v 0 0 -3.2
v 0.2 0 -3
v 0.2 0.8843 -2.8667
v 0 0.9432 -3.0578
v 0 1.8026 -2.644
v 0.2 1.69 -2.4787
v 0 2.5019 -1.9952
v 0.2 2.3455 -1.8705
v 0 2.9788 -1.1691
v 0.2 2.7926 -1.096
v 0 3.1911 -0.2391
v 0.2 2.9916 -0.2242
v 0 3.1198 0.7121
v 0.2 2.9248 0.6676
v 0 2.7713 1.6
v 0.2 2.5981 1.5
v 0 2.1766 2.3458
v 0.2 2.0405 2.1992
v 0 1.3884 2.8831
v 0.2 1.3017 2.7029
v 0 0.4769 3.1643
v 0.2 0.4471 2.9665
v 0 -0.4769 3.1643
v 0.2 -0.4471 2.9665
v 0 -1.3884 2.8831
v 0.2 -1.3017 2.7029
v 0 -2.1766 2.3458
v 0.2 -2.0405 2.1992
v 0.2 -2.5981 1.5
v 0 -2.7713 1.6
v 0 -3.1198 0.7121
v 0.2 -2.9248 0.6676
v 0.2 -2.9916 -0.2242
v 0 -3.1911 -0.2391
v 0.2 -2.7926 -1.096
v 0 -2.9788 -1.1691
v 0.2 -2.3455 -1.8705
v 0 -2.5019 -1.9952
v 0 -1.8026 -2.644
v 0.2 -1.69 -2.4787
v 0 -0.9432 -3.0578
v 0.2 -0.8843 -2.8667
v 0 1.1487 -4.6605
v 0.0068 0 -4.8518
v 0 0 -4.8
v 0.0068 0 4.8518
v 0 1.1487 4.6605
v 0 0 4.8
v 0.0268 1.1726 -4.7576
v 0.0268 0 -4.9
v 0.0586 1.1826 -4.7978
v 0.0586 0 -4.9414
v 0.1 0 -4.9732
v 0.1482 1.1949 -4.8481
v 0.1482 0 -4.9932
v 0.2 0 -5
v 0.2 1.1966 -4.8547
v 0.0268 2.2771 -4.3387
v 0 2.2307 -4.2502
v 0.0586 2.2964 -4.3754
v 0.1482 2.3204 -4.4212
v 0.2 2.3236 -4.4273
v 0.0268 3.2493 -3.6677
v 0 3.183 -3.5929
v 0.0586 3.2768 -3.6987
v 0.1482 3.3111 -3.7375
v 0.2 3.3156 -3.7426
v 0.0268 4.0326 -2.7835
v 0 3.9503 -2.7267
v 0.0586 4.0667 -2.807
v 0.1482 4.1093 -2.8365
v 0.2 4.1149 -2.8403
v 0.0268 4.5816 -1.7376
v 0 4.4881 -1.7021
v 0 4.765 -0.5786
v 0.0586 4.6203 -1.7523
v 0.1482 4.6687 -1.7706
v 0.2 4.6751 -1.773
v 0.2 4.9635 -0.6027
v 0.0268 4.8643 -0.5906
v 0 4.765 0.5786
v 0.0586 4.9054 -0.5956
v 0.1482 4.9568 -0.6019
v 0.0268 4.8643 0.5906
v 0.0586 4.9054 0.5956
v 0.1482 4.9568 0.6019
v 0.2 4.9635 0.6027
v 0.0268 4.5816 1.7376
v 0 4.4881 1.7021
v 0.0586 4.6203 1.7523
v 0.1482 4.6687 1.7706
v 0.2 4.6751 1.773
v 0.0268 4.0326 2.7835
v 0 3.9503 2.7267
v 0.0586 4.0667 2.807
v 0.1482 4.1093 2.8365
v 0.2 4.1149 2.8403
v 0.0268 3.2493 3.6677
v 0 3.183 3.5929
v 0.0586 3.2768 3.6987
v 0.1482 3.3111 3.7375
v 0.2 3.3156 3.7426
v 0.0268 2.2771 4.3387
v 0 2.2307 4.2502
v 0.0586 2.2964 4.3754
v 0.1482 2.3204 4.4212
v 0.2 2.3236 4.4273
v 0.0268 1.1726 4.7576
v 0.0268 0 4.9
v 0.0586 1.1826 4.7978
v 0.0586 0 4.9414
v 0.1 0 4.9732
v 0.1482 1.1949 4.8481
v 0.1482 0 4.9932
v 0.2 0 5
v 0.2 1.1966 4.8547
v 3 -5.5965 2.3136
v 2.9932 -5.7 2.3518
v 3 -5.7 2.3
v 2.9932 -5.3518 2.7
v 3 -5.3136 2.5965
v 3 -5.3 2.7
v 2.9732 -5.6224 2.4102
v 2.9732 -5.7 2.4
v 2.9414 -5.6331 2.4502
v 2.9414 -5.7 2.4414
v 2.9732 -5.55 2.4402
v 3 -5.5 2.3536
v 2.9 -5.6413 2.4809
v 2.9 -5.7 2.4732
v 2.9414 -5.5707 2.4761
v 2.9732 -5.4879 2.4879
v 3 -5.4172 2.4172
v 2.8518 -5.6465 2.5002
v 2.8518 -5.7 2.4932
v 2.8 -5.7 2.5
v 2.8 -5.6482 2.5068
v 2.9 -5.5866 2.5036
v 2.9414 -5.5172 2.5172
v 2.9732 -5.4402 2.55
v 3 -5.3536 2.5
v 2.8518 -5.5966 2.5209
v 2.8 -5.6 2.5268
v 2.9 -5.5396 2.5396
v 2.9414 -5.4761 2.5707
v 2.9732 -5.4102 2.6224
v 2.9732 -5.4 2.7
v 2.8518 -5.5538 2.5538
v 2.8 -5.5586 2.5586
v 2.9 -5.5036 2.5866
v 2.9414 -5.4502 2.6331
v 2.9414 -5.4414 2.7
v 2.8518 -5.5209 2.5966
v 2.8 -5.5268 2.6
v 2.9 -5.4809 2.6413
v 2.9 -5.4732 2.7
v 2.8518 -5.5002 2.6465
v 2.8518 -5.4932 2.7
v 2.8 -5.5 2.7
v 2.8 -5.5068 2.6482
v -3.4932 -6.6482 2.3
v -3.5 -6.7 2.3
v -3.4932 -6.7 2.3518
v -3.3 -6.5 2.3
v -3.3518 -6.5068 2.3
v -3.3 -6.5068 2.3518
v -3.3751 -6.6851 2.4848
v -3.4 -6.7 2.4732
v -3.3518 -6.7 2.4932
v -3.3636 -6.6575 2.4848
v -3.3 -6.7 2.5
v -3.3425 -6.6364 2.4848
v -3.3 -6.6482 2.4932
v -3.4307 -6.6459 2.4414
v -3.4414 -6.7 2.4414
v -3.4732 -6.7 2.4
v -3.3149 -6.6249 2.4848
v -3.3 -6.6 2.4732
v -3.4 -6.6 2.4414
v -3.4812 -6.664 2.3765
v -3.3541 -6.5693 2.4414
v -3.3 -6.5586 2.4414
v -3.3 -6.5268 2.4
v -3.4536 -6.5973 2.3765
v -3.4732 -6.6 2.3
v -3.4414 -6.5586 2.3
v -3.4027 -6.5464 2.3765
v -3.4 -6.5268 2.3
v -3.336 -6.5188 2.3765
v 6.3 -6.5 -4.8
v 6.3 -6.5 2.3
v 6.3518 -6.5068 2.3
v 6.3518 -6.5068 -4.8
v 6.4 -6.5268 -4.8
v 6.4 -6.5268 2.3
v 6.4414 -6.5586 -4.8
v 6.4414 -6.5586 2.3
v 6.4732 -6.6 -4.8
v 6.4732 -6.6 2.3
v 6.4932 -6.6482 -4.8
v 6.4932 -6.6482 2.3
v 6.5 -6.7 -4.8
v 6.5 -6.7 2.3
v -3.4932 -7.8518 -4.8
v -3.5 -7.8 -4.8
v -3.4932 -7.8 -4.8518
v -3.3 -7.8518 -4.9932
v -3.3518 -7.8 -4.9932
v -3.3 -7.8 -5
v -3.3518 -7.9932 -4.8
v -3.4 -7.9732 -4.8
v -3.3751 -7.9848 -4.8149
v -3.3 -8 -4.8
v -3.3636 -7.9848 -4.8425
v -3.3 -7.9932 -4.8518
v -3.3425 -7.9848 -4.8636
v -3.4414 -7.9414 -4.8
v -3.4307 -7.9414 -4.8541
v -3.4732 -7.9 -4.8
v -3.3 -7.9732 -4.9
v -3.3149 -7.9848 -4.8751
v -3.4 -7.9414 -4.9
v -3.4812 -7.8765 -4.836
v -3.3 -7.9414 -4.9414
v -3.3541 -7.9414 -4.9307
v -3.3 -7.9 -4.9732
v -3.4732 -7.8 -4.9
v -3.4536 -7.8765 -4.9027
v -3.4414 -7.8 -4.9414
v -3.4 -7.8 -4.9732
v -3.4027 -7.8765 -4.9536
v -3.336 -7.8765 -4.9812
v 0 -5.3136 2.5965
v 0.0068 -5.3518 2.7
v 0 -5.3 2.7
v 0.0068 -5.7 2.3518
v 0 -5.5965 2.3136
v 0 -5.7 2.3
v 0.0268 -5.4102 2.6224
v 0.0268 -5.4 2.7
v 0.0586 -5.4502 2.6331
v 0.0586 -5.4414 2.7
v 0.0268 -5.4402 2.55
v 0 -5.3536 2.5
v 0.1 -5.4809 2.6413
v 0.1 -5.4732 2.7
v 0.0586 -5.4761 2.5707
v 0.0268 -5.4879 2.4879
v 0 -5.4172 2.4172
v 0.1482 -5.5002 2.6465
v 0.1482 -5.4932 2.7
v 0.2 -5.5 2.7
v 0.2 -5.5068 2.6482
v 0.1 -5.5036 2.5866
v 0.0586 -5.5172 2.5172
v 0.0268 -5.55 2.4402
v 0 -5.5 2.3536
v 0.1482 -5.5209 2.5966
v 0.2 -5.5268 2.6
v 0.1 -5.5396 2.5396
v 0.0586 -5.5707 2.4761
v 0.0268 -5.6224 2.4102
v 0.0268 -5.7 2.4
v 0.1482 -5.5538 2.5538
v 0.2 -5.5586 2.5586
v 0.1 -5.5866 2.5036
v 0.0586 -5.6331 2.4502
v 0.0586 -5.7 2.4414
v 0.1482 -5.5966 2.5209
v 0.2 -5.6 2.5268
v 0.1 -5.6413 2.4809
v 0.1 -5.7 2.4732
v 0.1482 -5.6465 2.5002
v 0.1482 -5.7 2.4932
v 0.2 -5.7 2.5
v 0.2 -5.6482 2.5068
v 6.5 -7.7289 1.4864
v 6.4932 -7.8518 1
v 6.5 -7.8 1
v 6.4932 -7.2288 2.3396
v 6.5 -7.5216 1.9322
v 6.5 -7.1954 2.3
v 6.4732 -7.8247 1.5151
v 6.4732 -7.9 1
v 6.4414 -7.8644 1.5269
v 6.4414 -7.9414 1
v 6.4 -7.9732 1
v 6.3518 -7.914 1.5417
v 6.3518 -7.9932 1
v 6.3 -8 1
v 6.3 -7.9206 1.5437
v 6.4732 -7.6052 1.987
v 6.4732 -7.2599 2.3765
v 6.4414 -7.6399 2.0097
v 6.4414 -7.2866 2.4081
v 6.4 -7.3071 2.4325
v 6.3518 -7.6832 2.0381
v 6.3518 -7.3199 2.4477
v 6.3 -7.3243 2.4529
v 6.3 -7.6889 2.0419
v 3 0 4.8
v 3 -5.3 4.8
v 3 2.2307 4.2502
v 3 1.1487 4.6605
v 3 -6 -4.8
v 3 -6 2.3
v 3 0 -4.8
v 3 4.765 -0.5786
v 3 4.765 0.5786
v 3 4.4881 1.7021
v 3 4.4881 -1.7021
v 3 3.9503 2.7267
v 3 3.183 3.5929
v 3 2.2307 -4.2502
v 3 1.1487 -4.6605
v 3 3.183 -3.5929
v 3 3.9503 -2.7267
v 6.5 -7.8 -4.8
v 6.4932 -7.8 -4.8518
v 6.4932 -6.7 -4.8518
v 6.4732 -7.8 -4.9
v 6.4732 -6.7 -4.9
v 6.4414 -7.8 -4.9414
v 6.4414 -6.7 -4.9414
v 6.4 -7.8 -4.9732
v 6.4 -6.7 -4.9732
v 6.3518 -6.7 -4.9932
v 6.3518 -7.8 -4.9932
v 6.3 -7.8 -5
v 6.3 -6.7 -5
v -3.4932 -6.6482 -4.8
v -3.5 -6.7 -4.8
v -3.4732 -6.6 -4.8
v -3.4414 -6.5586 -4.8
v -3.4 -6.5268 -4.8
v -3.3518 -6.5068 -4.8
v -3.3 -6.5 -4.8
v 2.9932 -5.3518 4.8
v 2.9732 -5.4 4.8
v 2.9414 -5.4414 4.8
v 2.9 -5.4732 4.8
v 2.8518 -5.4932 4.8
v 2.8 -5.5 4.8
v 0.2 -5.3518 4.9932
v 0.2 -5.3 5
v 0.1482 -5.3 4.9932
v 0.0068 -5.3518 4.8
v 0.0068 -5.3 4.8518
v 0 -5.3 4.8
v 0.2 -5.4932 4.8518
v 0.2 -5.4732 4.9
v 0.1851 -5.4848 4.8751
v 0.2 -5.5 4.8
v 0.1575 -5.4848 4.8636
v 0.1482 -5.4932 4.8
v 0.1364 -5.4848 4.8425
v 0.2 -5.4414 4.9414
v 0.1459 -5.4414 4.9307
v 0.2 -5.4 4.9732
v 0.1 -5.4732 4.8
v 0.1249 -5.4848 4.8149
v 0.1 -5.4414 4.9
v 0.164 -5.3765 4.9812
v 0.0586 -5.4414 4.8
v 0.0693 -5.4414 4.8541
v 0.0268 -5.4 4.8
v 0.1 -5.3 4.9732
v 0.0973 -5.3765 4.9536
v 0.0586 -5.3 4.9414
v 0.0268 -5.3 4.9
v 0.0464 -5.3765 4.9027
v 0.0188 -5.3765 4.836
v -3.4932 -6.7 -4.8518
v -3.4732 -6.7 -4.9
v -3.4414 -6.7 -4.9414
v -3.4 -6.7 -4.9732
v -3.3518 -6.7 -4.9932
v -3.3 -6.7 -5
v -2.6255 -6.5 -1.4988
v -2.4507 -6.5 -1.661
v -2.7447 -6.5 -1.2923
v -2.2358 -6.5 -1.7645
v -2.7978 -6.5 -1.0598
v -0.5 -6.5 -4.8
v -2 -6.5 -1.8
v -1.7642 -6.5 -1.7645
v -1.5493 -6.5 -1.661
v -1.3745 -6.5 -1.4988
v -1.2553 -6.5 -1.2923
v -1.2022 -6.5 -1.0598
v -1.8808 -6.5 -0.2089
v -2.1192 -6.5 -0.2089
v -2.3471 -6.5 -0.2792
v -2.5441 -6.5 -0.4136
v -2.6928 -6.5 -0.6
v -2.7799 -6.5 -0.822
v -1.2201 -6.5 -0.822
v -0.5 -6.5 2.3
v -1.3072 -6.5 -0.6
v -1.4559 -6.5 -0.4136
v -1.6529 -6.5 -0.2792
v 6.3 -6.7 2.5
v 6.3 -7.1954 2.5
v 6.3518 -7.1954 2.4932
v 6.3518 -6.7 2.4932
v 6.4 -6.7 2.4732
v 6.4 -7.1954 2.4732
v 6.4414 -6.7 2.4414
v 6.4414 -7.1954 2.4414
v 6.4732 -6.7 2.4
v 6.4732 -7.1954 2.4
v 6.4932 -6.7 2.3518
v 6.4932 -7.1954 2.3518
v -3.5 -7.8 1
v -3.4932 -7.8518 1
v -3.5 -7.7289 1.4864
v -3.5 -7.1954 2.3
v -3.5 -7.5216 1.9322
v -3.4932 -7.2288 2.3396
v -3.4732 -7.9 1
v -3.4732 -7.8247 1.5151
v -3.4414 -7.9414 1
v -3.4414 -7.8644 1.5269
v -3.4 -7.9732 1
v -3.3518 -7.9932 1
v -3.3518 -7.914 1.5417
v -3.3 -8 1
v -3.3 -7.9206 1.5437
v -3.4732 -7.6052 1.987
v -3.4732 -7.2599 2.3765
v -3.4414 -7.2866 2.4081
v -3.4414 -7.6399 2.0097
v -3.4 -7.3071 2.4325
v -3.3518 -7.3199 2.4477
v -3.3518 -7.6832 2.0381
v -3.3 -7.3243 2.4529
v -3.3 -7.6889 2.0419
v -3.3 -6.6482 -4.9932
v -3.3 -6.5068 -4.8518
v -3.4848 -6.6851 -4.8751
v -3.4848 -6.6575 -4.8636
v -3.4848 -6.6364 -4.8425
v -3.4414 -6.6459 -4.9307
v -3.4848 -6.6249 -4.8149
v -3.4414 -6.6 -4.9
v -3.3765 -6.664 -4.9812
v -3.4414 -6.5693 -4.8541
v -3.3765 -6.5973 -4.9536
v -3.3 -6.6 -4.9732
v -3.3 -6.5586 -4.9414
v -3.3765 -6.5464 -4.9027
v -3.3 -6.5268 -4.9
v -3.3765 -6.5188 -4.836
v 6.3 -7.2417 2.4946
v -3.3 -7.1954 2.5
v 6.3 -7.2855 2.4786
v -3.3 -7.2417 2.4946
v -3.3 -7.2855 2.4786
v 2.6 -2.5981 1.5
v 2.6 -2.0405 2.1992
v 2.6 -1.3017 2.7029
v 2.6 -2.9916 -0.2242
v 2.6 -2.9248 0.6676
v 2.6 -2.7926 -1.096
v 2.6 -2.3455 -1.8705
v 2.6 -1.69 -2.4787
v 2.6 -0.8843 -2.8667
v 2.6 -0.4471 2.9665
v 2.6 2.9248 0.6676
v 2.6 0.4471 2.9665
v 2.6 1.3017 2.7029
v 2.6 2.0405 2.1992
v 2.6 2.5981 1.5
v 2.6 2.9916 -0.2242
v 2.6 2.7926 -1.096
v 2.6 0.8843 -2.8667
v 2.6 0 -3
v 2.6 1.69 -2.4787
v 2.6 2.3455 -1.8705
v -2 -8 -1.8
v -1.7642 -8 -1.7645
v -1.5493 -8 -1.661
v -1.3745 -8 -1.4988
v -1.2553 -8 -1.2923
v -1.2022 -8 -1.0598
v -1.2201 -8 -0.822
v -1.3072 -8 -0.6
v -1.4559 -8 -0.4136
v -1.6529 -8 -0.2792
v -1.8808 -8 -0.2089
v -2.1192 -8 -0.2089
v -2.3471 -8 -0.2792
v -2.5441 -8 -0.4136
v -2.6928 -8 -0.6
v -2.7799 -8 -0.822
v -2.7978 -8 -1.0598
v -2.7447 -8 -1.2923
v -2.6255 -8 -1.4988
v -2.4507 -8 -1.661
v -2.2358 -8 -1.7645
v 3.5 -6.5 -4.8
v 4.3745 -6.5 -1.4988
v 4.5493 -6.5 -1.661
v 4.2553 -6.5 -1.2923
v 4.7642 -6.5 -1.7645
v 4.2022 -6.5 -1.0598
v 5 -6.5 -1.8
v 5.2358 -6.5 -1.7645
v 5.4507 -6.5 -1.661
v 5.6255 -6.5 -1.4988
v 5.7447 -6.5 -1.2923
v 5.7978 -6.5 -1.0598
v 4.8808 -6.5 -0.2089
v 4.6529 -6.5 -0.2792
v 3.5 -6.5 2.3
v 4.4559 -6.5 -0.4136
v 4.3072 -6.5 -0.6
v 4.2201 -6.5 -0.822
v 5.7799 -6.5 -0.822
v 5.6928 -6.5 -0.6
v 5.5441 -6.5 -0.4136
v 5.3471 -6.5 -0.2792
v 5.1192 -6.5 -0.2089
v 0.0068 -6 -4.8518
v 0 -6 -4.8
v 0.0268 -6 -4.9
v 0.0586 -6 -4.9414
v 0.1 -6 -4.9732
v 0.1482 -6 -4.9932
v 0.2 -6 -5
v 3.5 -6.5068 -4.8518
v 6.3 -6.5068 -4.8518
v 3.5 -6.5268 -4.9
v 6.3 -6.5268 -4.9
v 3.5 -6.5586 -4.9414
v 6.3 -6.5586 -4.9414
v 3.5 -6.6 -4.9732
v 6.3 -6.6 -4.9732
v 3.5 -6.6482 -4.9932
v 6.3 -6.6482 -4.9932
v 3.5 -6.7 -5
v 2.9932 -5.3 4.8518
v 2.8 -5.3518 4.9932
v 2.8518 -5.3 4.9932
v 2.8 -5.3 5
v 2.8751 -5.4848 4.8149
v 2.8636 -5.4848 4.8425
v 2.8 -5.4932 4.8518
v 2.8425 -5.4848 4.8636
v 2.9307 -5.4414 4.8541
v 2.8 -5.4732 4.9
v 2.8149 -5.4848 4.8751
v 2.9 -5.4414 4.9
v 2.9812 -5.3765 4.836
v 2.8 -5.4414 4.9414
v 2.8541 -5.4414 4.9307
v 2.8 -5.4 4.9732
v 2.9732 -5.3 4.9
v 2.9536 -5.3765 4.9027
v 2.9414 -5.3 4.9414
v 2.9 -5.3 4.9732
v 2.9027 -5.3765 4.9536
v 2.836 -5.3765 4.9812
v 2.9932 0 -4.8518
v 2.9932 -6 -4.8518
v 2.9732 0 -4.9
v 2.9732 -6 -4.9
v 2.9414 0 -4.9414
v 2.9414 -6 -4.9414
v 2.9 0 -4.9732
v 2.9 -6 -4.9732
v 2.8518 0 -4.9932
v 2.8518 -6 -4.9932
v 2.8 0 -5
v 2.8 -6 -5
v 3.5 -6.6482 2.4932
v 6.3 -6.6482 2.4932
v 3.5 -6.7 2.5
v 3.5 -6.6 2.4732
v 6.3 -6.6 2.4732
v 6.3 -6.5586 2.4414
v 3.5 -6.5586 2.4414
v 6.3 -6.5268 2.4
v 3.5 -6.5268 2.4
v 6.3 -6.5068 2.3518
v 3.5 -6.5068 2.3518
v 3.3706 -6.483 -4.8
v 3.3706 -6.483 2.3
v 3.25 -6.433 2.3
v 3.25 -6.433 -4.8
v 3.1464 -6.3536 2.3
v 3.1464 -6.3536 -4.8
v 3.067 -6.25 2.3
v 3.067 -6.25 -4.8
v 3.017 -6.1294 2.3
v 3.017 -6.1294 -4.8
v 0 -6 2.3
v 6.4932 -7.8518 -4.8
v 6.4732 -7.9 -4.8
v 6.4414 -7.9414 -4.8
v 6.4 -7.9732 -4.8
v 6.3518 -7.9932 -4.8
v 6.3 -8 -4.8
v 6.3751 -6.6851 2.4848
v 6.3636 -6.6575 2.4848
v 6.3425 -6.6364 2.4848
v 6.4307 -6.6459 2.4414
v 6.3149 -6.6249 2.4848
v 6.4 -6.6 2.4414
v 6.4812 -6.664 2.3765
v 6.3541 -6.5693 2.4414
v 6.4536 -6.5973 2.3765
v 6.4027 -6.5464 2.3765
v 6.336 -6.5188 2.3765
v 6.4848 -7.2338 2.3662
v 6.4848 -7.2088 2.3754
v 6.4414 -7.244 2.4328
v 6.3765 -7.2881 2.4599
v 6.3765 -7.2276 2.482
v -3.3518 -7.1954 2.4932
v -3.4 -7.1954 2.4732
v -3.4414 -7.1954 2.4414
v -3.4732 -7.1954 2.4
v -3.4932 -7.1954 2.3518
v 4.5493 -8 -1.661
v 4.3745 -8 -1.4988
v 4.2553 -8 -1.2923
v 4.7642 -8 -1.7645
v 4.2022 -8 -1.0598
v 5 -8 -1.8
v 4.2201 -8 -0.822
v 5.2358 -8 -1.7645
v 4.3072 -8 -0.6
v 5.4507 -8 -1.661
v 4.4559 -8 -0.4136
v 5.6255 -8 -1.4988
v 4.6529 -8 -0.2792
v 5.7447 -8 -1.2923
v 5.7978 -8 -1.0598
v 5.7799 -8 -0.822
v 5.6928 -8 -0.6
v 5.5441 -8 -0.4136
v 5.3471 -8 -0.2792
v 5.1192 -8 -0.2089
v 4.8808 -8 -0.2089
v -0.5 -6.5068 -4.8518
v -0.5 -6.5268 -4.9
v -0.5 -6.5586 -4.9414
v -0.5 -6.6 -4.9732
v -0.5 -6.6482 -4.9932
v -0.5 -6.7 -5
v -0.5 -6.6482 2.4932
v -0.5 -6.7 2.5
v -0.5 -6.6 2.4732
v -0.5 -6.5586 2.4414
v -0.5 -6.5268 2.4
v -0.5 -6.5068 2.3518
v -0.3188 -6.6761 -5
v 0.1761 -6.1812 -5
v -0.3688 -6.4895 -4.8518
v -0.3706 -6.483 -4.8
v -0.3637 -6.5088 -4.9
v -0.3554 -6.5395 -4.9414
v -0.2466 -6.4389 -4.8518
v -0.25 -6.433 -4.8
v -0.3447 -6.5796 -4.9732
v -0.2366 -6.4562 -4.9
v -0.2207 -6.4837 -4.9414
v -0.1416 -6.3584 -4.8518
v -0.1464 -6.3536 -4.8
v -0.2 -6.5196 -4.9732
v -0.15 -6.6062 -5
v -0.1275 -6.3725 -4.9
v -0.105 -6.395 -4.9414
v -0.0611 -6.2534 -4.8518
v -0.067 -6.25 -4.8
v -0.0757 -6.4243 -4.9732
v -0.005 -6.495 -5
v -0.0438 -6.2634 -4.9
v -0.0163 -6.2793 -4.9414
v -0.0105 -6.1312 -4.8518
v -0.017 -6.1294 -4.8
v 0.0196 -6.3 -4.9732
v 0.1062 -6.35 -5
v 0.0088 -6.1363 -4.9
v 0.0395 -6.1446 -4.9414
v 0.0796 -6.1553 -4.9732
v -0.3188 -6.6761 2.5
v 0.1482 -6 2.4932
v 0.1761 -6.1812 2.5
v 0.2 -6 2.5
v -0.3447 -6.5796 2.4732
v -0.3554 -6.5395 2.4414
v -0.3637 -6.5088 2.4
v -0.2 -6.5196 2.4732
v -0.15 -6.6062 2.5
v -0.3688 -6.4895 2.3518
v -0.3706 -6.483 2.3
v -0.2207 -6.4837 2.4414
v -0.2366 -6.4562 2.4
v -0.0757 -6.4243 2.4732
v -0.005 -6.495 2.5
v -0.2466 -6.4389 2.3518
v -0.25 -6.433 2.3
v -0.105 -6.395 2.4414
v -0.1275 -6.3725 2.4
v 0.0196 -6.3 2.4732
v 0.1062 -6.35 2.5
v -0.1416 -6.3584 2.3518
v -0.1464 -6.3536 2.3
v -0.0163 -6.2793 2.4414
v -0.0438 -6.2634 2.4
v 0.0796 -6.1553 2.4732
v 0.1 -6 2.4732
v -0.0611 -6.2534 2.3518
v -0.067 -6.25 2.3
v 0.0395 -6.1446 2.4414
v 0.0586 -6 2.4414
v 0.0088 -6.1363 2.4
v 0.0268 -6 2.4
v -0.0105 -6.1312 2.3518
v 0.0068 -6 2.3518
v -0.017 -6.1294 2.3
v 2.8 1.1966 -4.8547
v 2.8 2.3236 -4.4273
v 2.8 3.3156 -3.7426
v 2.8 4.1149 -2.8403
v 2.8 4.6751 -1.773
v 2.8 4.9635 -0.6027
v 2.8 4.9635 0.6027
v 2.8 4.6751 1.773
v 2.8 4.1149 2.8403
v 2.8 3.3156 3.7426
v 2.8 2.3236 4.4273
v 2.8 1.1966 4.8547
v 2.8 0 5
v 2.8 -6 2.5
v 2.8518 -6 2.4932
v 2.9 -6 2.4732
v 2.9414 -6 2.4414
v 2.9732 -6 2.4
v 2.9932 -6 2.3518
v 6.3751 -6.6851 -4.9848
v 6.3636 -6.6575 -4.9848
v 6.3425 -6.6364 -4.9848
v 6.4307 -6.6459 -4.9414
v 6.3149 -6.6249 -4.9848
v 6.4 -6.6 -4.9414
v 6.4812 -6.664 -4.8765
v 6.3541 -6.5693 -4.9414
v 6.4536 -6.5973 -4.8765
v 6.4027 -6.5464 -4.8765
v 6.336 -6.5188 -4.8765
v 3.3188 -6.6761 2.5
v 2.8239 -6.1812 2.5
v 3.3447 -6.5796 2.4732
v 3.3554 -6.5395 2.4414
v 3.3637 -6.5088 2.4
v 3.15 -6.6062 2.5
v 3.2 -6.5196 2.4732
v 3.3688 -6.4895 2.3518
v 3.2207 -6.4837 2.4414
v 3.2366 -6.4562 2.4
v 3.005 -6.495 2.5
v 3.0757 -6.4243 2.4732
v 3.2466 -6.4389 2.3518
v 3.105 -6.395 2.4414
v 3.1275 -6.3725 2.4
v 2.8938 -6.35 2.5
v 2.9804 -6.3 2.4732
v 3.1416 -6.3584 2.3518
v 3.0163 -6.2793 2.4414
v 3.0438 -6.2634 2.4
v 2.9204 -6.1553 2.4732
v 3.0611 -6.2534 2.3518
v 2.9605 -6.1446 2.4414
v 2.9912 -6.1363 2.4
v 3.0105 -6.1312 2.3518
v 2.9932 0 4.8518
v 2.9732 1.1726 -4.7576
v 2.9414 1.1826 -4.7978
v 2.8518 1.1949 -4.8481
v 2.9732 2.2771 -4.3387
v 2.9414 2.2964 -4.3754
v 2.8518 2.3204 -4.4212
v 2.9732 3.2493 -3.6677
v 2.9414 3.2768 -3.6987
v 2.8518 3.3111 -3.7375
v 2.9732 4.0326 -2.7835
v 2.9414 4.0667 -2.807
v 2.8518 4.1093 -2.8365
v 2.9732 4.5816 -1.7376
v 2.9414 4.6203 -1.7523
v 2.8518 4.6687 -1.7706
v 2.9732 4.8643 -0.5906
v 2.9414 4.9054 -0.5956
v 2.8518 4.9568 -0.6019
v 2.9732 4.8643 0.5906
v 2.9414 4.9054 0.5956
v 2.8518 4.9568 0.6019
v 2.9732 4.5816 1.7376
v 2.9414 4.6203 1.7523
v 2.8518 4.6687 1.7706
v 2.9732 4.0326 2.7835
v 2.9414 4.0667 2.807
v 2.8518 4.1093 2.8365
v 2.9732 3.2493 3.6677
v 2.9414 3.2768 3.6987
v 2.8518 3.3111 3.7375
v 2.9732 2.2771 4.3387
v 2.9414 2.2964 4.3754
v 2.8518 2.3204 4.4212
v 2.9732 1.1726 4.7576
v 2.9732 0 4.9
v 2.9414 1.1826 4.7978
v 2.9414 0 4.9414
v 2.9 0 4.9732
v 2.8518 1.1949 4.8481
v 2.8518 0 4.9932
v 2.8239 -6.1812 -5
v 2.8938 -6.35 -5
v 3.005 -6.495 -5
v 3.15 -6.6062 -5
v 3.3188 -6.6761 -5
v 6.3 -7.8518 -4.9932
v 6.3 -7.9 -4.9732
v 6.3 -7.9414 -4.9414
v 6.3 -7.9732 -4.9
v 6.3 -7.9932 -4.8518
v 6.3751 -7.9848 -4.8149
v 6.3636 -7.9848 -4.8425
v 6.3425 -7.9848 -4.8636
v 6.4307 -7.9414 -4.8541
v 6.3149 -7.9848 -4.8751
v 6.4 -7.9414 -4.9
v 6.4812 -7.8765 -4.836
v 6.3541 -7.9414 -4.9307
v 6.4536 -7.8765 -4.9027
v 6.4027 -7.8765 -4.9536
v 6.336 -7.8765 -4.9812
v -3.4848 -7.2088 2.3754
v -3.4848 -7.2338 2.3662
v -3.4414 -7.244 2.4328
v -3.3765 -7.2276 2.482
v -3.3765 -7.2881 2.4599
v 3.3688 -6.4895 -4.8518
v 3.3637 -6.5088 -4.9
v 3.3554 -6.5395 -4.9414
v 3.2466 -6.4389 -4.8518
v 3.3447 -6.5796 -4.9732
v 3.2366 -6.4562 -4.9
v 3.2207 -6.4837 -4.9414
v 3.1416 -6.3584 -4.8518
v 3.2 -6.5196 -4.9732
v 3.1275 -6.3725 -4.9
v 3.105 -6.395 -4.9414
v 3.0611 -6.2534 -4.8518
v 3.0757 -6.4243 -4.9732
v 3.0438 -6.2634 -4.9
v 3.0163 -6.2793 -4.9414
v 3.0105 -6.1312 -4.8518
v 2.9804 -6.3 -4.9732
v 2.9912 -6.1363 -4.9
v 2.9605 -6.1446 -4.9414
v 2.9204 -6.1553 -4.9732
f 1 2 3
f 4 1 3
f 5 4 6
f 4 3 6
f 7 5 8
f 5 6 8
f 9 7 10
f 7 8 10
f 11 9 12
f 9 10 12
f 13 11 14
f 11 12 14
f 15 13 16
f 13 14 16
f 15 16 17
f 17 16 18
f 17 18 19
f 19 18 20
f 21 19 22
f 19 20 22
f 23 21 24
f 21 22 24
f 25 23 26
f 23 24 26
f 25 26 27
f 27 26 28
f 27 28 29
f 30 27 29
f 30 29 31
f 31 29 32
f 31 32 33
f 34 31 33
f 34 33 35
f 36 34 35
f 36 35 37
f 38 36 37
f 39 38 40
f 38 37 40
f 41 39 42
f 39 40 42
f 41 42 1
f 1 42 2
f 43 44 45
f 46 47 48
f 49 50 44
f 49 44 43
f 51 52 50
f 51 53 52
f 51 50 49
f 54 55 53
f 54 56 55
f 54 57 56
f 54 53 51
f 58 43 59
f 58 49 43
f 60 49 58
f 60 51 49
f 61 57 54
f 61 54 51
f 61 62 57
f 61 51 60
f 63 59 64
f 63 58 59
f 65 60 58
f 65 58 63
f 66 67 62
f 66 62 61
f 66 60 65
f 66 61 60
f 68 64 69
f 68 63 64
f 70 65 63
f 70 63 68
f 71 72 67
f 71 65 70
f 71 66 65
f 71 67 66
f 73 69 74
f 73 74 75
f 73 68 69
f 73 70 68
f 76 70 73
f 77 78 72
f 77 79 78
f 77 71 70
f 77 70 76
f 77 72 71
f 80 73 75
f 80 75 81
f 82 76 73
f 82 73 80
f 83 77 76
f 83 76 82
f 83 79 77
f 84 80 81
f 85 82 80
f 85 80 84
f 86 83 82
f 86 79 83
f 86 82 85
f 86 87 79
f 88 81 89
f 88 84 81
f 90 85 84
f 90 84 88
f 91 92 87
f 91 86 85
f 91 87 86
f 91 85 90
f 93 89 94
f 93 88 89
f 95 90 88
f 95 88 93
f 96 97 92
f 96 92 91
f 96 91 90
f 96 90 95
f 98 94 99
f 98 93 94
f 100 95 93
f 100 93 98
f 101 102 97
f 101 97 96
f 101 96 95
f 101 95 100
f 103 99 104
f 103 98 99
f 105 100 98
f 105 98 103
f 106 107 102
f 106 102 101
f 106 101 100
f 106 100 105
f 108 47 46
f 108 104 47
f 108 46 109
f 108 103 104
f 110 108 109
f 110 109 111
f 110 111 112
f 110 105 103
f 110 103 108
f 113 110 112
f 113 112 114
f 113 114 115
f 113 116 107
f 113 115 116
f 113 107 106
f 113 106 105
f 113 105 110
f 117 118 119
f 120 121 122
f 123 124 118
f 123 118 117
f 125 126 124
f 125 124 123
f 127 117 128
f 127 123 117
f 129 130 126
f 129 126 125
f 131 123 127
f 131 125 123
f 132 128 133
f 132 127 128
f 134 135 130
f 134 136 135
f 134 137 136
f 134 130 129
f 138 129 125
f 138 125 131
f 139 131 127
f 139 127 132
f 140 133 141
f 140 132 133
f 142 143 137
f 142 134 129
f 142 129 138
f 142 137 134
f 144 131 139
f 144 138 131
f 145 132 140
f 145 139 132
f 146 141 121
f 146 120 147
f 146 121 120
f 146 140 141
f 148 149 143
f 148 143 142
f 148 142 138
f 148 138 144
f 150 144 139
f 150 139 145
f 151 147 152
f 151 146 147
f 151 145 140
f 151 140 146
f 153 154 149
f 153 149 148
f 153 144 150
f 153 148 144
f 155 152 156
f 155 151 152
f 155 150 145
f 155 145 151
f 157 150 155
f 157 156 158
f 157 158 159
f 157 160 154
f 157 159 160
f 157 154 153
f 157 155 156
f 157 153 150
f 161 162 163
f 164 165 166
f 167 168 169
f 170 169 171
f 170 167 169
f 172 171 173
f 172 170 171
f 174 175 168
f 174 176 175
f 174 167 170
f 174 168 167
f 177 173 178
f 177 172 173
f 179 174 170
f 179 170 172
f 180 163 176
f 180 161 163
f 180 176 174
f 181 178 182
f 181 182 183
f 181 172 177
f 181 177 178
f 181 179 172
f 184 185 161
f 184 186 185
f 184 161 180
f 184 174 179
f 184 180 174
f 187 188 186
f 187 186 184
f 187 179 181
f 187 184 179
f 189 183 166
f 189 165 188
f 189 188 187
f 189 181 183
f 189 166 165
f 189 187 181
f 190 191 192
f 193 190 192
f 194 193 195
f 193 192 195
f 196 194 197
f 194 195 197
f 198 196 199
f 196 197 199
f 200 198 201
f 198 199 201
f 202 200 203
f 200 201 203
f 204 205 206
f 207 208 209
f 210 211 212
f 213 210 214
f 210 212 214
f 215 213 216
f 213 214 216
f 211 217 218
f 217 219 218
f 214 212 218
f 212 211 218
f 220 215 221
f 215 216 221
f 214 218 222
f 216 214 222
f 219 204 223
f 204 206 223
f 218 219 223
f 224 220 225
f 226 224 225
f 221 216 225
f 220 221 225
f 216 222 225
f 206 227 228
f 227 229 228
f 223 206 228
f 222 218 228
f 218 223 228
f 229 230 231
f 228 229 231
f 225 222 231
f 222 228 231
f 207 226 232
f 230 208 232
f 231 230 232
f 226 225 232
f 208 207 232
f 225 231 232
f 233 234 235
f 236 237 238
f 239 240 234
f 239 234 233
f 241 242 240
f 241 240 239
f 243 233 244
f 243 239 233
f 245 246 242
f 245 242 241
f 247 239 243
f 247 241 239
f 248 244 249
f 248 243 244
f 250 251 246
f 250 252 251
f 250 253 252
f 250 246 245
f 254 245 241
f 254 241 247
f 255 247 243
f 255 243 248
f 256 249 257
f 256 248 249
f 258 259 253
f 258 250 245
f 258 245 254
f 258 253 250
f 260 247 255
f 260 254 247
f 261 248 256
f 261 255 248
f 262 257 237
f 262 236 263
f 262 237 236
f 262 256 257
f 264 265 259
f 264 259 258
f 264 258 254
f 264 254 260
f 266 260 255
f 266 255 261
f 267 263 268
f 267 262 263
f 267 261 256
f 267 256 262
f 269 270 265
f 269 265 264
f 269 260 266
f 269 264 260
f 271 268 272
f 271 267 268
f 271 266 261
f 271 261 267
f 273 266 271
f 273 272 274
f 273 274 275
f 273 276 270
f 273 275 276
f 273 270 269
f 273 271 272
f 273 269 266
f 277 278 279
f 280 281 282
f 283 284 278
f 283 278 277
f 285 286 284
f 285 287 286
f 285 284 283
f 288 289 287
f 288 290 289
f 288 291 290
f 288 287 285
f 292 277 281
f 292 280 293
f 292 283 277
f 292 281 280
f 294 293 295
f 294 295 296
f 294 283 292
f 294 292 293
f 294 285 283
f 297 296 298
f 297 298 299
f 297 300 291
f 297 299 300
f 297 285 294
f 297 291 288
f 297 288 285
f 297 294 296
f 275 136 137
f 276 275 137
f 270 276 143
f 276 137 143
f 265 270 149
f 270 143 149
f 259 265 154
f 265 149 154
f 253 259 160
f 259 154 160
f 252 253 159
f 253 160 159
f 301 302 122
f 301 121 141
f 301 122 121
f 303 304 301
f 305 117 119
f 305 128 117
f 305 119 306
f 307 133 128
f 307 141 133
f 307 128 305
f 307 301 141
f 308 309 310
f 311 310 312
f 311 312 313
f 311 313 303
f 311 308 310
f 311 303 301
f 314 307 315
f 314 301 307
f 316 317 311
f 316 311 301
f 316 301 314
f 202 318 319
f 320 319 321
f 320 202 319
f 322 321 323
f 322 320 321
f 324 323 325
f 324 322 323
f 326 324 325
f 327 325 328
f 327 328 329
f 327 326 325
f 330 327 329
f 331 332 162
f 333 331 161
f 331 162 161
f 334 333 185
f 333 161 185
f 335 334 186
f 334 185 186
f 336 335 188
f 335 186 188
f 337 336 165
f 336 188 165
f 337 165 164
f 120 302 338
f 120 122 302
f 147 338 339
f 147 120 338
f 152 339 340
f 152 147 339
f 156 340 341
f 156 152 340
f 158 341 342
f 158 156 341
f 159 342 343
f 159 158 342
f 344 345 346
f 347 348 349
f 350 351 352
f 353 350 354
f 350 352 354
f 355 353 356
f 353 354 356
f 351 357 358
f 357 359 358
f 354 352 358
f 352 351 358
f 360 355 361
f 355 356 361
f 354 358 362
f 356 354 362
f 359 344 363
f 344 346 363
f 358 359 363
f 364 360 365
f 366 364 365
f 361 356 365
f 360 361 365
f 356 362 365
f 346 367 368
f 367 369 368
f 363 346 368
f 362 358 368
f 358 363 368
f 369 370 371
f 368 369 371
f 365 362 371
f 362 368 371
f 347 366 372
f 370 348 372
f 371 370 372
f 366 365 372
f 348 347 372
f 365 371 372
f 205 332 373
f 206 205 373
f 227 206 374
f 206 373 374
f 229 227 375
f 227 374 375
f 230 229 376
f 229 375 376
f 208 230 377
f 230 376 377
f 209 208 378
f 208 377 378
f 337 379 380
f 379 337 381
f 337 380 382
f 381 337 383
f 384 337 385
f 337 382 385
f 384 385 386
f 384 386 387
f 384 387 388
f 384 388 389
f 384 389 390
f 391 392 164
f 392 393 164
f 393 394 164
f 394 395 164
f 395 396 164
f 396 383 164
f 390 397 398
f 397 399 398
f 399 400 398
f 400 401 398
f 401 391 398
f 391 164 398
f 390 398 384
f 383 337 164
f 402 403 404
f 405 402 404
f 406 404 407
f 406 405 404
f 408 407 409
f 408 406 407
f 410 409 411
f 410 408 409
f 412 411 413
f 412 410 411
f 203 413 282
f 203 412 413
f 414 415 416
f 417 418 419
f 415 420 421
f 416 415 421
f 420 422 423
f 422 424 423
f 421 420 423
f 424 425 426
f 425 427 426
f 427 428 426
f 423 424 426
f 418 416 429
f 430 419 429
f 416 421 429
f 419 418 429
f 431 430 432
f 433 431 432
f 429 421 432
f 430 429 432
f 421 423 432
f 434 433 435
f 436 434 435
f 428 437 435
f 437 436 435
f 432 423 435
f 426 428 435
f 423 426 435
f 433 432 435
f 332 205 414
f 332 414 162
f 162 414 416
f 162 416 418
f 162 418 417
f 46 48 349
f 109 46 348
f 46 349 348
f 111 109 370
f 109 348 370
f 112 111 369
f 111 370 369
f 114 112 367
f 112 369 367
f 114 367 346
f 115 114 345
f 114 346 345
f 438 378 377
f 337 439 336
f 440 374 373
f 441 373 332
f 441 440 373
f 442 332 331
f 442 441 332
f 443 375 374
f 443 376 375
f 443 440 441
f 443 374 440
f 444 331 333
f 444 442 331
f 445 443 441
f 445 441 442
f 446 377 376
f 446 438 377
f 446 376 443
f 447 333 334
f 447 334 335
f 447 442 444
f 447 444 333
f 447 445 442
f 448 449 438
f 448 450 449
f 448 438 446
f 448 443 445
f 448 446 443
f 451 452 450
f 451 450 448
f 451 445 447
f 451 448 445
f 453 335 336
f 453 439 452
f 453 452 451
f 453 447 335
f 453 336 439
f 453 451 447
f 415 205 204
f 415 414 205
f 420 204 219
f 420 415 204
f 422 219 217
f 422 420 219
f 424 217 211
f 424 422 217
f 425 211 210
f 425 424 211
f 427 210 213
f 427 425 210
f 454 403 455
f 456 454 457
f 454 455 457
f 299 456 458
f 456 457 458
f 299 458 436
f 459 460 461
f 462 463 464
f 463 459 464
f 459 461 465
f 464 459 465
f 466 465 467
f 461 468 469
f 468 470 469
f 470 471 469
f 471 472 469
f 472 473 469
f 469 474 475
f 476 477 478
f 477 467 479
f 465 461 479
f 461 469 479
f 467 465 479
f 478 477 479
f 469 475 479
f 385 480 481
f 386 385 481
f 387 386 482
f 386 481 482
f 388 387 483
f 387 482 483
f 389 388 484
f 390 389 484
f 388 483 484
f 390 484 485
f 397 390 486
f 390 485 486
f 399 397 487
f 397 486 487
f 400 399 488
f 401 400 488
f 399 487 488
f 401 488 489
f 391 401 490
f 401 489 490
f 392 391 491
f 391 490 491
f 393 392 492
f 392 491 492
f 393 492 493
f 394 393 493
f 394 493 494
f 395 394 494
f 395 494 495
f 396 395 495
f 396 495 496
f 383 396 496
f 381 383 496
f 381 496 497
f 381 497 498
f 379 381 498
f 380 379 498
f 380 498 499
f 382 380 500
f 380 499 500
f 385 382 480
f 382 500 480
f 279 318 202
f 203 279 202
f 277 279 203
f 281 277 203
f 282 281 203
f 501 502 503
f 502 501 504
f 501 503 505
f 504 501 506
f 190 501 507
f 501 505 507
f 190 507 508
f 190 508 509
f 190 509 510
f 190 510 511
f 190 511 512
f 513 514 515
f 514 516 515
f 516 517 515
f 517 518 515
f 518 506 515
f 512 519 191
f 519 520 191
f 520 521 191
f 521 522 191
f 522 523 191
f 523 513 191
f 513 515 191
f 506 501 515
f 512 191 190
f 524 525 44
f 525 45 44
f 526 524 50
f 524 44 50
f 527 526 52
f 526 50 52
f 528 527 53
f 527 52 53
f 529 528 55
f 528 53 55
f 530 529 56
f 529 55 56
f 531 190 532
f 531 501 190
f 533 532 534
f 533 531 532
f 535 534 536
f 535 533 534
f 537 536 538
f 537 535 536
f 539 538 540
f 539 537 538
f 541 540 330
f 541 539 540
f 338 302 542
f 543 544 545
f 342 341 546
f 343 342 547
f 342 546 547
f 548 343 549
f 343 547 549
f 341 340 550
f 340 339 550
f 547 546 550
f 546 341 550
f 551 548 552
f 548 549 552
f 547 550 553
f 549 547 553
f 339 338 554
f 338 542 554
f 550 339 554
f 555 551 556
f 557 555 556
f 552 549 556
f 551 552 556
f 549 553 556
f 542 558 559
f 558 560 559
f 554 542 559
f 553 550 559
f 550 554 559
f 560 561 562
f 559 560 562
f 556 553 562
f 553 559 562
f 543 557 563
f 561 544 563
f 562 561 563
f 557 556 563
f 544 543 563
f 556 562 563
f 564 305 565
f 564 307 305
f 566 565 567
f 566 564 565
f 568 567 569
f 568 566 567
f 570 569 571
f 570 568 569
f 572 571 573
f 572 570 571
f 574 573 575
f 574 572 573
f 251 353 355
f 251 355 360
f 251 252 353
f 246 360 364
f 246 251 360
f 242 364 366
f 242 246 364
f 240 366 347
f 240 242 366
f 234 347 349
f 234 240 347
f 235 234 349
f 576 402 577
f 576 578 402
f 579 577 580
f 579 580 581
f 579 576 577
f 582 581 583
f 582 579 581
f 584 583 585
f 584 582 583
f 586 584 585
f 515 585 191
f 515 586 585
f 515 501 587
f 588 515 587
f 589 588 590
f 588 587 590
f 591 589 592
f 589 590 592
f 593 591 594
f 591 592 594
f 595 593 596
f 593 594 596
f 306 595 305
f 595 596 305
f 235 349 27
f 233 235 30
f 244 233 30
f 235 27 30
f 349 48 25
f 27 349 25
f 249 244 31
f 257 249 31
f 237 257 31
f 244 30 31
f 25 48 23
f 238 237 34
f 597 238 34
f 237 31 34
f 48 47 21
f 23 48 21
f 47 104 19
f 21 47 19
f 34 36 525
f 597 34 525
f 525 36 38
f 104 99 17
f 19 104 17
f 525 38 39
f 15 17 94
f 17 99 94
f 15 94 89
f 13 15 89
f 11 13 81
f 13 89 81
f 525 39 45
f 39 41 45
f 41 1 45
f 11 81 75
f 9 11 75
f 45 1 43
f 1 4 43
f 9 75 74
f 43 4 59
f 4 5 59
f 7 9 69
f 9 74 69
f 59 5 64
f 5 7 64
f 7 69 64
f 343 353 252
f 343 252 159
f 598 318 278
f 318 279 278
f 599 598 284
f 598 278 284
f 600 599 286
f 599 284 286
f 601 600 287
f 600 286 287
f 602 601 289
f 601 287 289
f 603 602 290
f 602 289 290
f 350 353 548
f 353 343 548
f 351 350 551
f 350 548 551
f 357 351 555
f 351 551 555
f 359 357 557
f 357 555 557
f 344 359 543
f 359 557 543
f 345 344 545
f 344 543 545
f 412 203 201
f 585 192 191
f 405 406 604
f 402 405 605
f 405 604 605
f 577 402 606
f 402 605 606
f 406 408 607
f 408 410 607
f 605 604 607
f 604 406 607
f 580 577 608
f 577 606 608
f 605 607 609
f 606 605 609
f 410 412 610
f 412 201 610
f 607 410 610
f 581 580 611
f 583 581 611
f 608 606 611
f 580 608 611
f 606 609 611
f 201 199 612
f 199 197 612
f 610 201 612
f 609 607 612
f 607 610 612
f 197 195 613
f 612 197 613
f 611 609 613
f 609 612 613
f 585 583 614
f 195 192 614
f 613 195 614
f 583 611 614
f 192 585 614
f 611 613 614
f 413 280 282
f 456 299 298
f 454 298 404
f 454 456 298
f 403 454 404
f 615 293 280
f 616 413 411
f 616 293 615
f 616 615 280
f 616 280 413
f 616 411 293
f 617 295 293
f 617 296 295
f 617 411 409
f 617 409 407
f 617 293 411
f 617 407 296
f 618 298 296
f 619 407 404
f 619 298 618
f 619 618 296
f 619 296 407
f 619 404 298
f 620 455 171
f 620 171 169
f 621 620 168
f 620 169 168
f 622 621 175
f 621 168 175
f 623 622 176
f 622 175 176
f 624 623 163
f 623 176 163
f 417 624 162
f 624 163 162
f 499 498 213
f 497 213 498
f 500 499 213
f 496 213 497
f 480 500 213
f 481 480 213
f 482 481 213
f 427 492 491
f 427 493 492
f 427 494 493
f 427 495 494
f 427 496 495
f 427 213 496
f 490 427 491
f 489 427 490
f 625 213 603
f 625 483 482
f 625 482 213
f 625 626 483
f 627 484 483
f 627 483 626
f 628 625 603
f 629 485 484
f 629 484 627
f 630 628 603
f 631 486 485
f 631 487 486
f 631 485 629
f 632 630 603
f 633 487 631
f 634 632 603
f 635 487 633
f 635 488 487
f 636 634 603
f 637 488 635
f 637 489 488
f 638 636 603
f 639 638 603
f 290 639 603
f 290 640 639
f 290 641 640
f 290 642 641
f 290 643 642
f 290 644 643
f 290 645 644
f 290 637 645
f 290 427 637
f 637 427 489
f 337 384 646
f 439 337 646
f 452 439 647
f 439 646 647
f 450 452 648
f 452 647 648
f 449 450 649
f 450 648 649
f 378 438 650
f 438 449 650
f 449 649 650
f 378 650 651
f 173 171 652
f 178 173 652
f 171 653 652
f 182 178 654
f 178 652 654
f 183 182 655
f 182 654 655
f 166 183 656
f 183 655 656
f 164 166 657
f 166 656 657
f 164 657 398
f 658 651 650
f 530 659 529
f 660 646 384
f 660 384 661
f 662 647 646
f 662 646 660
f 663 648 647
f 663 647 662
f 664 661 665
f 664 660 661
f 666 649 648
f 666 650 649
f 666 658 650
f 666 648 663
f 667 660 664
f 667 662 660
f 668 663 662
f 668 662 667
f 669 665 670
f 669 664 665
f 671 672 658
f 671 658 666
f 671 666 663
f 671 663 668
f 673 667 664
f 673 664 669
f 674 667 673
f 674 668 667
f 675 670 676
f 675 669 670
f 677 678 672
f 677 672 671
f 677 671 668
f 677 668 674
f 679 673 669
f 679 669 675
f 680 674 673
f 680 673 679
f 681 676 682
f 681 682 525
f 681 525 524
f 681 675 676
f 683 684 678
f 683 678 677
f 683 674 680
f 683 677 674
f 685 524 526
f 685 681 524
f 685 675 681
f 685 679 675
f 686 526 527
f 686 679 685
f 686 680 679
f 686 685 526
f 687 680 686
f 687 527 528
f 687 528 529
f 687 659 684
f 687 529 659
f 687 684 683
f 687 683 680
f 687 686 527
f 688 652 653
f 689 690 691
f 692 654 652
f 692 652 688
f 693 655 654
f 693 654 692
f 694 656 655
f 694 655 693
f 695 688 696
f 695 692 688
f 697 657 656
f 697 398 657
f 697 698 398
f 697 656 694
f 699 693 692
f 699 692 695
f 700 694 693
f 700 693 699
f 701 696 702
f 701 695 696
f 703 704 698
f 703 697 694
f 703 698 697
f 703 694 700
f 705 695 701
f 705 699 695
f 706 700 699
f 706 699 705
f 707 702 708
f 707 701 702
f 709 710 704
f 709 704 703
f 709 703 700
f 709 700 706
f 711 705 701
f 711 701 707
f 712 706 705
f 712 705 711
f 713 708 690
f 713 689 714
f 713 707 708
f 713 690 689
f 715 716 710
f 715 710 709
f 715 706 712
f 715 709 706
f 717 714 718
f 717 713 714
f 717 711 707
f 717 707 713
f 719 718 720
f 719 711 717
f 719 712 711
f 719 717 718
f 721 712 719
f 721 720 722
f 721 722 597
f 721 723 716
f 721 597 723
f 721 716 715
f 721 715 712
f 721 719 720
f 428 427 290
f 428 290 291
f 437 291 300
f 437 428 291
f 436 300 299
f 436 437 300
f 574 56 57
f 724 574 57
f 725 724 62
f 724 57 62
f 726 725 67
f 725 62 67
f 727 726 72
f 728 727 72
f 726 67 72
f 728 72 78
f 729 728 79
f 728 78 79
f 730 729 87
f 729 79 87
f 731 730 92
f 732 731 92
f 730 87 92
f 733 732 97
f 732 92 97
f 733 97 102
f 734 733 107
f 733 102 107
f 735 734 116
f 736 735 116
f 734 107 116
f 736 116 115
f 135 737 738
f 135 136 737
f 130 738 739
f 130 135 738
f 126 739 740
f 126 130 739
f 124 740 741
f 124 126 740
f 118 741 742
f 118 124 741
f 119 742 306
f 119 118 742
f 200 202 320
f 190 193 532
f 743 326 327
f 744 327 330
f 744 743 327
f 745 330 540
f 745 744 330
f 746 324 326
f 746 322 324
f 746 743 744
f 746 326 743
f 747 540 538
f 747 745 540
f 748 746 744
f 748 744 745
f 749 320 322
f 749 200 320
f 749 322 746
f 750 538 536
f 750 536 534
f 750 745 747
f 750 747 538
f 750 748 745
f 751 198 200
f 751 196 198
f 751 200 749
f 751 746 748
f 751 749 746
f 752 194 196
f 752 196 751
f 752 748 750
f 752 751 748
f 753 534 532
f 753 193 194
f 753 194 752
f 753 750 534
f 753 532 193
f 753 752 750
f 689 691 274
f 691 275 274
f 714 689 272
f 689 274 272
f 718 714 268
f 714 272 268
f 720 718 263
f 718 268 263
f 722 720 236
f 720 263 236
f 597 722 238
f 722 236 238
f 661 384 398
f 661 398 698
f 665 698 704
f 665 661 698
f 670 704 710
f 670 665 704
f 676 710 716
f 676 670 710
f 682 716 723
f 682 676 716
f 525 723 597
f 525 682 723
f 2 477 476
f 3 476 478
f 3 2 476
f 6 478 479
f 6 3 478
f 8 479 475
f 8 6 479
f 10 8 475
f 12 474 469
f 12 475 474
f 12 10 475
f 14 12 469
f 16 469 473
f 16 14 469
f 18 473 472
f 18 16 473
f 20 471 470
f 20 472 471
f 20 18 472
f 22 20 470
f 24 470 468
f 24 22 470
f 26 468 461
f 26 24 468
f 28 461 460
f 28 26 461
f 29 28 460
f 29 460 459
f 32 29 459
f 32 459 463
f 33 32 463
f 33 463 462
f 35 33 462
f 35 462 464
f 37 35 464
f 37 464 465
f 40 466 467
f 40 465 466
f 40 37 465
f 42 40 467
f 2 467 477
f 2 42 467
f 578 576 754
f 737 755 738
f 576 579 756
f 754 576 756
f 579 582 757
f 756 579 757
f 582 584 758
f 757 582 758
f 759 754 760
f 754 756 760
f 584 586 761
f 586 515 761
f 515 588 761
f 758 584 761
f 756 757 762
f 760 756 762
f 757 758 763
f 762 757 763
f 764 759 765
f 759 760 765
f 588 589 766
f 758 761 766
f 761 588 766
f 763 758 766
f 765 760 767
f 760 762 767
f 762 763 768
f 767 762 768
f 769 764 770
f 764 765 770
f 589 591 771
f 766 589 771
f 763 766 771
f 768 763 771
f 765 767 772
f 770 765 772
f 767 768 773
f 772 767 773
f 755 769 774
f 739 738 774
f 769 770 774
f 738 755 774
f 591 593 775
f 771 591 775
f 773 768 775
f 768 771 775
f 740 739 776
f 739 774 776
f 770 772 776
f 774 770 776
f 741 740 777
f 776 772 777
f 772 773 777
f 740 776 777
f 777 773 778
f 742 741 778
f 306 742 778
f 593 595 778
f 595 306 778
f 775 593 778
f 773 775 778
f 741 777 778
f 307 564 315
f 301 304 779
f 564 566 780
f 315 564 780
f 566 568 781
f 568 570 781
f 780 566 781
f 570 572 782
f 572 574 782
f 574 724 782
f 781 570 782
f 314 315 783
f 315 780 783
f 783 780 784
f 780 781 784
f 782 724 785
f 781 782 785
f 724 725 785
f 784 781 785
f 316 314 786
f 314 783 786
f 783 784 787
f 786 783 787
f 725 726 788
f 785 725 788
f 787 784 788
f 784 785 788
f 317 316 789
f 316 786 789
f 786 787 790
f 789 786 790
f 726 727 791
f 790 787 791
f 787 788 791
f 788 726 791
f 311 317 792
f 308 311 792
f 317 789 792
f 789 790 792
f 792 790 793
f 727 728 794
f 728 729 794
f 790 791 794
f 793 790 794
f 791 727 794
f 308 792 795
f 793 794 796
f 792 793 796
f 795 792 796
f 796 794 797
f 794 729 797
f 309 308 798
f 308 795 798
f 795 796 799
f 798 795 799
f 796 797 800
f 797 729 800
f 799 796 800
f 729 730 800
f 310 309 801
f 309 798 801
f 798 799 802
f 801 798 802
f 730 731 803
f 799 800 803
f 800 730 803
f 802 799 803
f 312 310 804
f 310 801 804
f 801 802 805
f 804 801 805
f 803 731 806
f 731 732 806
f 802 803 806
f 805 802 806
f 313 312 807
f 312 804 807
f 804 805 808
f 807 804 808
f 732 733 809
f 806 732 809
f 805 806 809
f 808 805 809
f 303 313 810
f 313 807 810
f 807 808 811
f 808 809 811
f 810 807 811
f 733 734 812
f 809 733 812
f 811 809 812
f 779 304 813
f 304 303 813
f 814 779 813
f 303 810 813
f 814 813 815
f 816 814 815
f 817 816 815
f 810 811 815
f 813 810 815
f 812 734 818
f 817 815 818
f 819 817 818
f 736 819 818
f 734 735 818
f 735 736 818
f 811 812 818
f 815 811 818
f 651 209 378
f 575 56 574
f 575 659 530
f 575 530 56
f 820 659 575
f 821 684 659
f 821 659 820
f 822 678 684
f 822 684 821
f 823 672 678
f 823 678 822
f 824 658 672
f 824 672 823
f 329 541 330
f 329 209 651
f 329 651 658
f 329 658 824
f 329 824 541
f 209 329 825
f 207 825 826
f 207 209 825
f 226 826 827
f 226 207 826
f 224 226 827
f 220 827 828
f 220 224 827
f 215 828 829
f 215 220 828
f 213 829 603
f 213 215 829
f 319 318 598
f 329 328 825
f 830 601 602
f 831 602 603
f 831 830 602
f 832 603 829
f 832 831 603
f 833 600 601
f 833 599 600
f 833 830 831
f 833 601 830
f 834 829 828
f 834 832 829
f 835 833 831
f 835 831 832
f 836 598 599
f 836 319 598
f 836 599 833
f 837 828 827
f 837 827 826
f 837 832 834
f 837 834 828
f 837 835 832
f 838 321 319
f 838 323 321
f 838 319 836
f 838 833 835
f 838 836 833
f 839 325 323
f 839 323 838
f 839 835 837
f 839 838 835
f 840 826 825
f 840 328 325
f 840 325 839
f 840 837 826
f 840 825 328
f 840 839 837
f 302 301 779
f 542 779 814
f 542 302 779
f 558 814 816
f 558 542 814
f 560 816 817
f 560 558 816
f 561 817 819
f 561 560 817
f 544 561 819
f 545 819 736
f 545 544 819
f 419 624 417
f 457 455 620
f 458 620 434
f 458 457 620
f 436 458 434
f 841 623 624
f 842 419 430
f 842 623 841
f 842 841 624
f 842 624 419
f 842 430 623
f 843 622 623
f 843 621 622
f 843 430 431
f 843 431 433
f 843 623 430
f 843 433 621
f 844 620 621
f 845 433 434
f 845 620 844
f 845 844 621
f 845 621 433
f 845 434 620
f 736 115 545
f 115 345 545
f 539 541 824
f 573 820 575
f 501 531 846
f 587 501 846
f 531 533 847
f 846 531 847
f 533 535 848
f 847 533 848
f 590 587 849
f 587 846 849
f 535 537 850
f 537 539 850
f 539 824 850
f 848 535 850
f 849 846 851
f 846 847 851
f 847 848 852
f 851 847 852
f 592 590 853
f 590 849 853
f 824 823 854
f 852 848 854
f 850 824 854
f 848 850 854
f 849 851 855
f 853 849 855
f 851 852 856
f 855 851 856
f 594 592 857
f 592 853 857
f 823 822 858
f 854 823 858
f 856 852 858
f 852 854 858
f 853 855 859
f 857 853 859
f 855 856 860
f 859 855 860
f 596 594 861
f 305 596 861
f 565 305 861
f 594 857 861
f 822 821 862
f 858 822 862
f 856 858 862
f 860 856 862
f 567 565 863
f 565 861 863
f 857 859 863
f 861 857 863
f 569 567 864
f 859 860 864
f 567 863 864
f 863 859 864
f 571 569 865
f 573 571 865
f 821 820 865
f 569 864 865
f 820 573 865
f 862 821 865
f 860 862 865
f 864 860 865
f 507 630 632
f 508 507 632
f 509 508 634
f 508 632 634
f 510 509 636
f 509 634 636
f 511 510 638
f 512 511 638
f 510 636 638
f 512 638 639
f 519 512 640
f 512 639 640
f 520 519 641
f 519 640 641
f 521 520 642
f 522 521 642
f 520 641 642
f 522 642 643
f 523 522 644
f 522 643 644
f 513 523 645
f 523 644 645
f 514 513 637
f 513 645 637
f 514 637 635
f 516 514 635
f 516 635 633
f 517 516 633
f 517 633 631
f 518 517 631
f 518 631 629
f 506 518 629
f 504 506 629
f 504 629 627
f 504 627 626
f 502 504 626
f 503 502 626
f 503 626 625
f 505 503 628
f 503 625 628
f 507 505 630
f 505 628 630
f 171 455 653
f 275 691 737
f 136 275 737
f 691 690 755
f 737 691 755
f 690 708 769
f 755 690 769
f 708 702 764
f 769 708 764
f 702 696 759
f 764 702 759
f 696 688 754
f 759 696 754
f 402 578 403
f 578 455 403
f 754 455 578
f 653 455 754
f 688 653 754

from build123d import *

# Parameters (mm, degrees)
SKETCH_1_R          = 3
EXTRUDE_1_DEPTH     = 3
SKETCH_2_W          = 10
SKETCH_2_H          = 10
SKETCH_2_R          = 0.8
EXTRUDE_2_DEPTH     = 1.5
SKETCH_5_W          = 10
SKETCH_5_H          = 2.5
CUT_EXTRUDE_1_DEPTH = 2.5
CUT_EXTRUDE_2_REACH = 15.748
FILLET_1_R          = 0.5
FILLET_2_R          = 0.2
CHAMFER_1_SIZE      = 0.2
SKETCH_3_R          = 3.977941141
EXTRUDE_3_DEPTH     = 0.4


with BuildPart() as part:
    # 草图1 → 凸台-拉伸1 (new body)
    with BuildSketch(Plane(origin=(0, 0, 0), x_dir=(0, 0, -1), z_dir=(1, 0, 0))):
        with BuildLine():
            Line((-5, 0), (-5, -8))
            Line((-5, -8), (5, -8))
            Line((5, -8), (5, 0))
            ThreePointArc((5, 0), (0, 5), (-5, 0))
        make_face()
        Circle(SKETCH_1_R, mode=Mode.SUBTRACT)
    extrude(amount=EXTRUDE_1_DEPTH)

    # 草图2 → 凸台-拉伸2 (add)
    with BuildSketch(Plane.XZ.offset(8)):
        with Locations((1.5, 0)):
            Rectangle(SKETCH_2_W, SKETCH_2_H)
        with Locations(Location((5, -1, 0), (0, 0, 270))):
            Circle(SKETCH_2_R, mode=Mode.SUBTRACT)
        with Locations(Location((-2, -1, 0), (0, 0, 270))):
            Circle(SKETCH_2_R, mode=Mode.SUBTRACT)
    extrude(amount=-EXTRUDE_2_DEPTH)

    # 草图5 → 切除-拉伸1 (cut)
    with BuildSketch(Plane.XZ.offset(8)):
        with Locations((1.5, 3.75)):
            Rectangle(SKETCH_5_W, SKETCH_5_H)
    extrude(amount=-CUT_EXTRUDE_1_DEPTH, mode=Mode.SUBTRACT)

    # 草图6 → 切除-拉伸2 (cut, up to next)
    with BuildSketch(Plane.ZY.offset(3.5), mode=Mode.PRIVATE) as cut_extrude_2_sk1:
        with BuildLine():
            Line((2.897366596, -6), (3.27705392, -6))
            Line((3.27705392, -6), (3.27705392, -8.325127743))
            Line((3.27705392, -8.325127743), (1, -8.325127743))
            Line((1, -8.325127743), (1, -8))
            ThreePointArc((1, -8), (2.378404875, -7.407669683), (2.897366596, -6))
        make_face()
    cut_extrude_2_tool1 = extrude(cut_extrude_2_sk1.sketch, amount=-CUT_EXTRUDE_2_REACH, mode=Mode.PRIVATE) & part.part
    add(cut_extrude_2_tool1.solids().sort_by_distance((-3.5, -7.575754, 2.569334))[0], mode=Mode.SUBTRACT)

    # 圆角1
    fillet_1_edges = [part.edges().sort_by_distance(p)[0] for p in [
        (3, -6.5, -1.25),
        (0, -6.5, -1.25),
    ]]
    fillet(fillet_1_edges, radius=FILLET_1_R)

    # 圆角2
    fillet_2_edges = [part.edges().sort_by_distance(p)[0] for p in [
        (-2, -6.5, -5),
        (-3.5, -7.25, -5),
        (6.5, -6.5, -1.25),
        (6.5, -7.25, -5),
        (6.5, -8, -2),
        (3, 5, 0),
        (-3.5, -6.5, -1.25),
        (3, -5.5, 3.75),
        (-3.5, -6.883095189, 2.5),
        (1.5, -5.5, 5),
        (0, -2.75, 5),
        (-2, -6.5, 2.5),
        (1.5, -5.5, 2.5),
        (6.5, -6.883095189, 2.5),
        (0, -5.5, 3.75),
        (0, 5, 0),
        (3, -2.75, 5),
        (-3.5, -8, -2),
        (1.5, -8, -5),
        (1.5, -7.266190379, 2.5),
        (-3.5, -7.806716397, 1.834936608),
        (6.5, -7.806716397, 1.834936608),
        (0, -5.75, 2.5),
        (0, -3, -5),
        (3, -5.75, 2.5),
        (3, -3, -5),
        (5, -6.5, 2.5),
        (5, -6.5, -5),
        (-0.146446609, -6.353553391, -5),
        (-0.146446609, -6.353553391, 2.5),
        (3.146446609, -6.353553391, -5),
        (3.146446609, -6.353553391, 2.5),
    ]]
    fillet(fillet_2_edges, radius=FILLET_2_R)

    # 倒角1
    chamfer_1_edges = [part.edges().sort_by_distance(p)[0] for p in [
        (0, 0, 3),
        (3, 0, 3),
    ]]
    chamfer(chamfer_1_edges, length=CHAMFER_1_SIZE)

    # 草图3 → 凸台-拉伸3 (add)
    with BuildSketch(Plane(origin=(3, 0, 0), x_dir=(0, 0, -1), z_dir=(1, 0, 0))):
        Circle(SKETCH_3_R)
    extrude(amount=-EXTRUDE_3_DEPTH)


solid = part.part
